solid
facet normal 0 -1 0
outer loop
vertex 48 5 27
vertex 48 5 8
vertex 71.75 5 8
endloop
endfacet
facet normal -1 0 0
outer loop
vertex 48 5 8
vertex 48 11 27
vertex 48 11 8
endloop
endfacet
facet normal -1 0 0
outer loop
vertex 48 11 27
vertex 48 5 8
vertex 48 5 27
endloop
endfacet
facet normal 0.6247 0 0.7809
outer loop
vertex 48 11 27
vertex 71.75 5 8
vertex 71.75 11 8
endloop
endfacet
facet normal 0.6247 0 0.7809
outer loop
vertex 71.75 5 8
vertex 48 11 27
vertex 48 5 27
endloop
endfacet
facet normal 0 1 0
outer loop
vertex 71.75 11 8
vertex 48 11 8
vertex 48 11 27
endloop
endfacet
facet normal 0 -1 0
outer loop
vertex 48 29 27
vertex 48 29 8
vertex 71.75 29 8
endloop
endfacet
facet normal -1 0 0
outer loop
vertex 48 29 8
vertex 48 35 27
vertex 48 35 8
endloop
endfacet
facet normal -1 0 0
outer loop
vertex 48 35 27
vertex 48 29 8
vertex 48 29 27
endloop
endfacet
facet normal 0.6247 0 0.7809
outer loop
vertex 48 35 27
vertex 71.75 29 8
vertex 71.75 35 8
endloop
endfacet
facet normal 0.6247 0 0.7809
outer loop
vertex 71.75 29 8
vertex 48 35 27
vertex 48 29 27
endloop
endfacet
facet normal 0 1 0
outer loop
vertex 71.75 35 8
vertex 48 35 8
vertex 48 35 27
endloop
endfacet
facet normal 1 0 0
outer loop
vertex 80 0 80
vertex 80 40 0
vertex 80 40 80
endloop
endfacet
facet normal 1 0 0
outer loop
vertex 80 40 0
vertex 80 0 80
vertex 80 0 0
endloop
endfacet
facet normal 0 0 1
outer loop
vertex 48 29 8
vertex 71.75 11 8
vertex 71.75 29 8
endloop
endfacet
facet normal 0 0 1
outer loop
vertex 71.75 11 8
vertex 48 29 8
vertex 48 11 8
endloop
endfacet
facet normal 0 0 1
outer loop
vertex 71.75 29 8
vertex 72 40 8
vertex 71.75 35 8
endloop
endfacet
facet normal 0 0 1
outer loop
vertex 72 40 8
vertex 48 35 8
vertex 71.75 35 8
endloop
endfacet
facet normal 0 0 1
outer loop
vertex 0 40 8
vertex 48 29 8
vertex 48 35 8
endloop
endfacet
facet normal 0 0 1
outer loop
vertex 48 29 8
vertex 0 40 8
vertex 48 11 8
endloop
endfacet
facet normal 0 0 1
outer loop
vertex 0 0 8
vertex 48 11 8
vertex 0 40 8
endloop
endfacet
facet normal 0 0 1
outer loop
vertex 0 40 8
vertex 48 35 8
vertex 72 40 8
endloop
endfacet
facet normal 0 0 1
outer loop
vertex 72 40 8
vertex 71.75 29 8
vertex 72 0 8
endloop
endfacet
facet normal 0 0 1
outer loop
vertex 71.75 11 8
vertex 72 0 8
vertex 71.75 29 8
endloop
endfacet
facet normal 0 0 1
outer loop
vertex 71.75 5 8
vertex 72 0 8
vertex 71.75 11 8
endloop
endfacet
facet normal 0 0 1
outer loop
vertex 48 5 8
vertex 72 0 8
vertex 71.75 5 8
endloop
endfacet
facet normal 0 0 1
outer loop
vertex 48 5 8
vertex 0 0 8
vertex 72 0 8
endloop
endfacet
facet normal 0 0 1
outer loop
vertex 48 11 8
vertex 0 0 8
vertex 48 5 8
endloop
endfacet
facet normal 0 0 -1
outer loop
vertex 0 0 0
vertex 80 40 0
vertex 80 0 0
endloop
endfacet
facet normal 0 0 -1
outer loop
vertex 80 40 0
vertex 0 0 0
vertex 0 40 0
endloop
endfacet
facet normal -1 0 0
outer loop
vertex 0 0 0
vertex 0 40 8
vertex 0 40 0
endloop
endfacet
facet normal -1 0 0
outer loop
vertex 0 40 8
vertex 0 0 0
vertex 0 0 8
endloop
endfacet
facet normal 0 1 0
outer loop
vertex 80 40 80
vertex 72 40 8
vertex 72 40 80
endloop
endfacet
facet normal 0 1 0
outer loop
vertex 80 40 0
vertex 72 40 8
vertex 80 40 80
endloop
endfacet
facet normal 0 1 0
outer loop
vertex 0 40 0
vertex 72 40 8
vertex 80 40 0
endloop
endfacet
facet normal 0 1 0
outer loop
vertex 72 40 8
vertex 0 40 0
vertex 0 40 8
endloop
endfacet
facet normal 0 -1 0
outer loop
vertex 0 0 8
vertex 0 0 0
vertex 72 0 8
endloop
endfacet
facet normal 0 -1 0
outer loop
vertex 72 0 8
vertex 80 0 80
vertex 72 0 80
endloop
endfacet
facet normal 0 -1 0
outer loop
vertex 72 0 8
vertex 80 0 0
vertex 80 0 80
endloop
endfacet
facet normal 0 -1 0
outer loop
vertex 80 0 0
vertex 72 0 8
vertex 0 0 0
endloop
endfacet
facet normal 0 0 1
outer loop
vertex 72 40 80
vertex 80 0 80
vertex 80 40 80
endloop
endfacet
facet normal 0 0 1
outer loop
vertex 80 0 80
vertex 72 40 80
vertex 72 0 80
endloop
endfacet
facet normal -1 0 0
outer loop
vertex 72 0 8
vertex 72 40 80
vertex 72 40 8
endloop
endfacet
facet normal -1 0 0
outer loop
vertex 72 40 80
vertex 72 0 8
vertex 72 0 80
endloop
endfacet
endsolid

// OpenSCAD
$fn = 32;

// ----------------------------------------------------------------------
// Rib bracket: 2-gusset L bracket
// ----------------------------------------------------------------------

// --- parameters (mm) ---
base_l = 80;              // foot length, X
base_w = 40;              // foot width, Y
base_t = 8;               // foot thickness
plate_t = 8;              // upright plate thickness
plate_h = 80;             // overall height
gus_l = 24;               // gusset leg along the foot
gus_h = 20;               // gusset height
gus_t = 6;                // gusset thickness
gus_edge = 5;             // gusset margin from the foot edge
n_gus = 2;                // gusset count

gus_pitch = (base_w - 2 * gus_edge - gus_t) / (n_gus - 1);  // gusset pitch

union() {
  cube([base_l, base_w, base_t]);
  translate([base_l - plate_t, 0, base_t - 1])
    cube([plate_t, base_w, plate_h - base_t + 1]);
  for (i = [0 : n_gus - 1])
    translate([base_l - plate_t - gus_l, gus_edge + i * gus_pitch, base_t - 1])
      rotate([-90, 0, 0])
        linear_extrude(height = gus_t)
          polygon(points = [[0, 0], [gus_l + 1, 0], [0, -gus_h]]);
}
